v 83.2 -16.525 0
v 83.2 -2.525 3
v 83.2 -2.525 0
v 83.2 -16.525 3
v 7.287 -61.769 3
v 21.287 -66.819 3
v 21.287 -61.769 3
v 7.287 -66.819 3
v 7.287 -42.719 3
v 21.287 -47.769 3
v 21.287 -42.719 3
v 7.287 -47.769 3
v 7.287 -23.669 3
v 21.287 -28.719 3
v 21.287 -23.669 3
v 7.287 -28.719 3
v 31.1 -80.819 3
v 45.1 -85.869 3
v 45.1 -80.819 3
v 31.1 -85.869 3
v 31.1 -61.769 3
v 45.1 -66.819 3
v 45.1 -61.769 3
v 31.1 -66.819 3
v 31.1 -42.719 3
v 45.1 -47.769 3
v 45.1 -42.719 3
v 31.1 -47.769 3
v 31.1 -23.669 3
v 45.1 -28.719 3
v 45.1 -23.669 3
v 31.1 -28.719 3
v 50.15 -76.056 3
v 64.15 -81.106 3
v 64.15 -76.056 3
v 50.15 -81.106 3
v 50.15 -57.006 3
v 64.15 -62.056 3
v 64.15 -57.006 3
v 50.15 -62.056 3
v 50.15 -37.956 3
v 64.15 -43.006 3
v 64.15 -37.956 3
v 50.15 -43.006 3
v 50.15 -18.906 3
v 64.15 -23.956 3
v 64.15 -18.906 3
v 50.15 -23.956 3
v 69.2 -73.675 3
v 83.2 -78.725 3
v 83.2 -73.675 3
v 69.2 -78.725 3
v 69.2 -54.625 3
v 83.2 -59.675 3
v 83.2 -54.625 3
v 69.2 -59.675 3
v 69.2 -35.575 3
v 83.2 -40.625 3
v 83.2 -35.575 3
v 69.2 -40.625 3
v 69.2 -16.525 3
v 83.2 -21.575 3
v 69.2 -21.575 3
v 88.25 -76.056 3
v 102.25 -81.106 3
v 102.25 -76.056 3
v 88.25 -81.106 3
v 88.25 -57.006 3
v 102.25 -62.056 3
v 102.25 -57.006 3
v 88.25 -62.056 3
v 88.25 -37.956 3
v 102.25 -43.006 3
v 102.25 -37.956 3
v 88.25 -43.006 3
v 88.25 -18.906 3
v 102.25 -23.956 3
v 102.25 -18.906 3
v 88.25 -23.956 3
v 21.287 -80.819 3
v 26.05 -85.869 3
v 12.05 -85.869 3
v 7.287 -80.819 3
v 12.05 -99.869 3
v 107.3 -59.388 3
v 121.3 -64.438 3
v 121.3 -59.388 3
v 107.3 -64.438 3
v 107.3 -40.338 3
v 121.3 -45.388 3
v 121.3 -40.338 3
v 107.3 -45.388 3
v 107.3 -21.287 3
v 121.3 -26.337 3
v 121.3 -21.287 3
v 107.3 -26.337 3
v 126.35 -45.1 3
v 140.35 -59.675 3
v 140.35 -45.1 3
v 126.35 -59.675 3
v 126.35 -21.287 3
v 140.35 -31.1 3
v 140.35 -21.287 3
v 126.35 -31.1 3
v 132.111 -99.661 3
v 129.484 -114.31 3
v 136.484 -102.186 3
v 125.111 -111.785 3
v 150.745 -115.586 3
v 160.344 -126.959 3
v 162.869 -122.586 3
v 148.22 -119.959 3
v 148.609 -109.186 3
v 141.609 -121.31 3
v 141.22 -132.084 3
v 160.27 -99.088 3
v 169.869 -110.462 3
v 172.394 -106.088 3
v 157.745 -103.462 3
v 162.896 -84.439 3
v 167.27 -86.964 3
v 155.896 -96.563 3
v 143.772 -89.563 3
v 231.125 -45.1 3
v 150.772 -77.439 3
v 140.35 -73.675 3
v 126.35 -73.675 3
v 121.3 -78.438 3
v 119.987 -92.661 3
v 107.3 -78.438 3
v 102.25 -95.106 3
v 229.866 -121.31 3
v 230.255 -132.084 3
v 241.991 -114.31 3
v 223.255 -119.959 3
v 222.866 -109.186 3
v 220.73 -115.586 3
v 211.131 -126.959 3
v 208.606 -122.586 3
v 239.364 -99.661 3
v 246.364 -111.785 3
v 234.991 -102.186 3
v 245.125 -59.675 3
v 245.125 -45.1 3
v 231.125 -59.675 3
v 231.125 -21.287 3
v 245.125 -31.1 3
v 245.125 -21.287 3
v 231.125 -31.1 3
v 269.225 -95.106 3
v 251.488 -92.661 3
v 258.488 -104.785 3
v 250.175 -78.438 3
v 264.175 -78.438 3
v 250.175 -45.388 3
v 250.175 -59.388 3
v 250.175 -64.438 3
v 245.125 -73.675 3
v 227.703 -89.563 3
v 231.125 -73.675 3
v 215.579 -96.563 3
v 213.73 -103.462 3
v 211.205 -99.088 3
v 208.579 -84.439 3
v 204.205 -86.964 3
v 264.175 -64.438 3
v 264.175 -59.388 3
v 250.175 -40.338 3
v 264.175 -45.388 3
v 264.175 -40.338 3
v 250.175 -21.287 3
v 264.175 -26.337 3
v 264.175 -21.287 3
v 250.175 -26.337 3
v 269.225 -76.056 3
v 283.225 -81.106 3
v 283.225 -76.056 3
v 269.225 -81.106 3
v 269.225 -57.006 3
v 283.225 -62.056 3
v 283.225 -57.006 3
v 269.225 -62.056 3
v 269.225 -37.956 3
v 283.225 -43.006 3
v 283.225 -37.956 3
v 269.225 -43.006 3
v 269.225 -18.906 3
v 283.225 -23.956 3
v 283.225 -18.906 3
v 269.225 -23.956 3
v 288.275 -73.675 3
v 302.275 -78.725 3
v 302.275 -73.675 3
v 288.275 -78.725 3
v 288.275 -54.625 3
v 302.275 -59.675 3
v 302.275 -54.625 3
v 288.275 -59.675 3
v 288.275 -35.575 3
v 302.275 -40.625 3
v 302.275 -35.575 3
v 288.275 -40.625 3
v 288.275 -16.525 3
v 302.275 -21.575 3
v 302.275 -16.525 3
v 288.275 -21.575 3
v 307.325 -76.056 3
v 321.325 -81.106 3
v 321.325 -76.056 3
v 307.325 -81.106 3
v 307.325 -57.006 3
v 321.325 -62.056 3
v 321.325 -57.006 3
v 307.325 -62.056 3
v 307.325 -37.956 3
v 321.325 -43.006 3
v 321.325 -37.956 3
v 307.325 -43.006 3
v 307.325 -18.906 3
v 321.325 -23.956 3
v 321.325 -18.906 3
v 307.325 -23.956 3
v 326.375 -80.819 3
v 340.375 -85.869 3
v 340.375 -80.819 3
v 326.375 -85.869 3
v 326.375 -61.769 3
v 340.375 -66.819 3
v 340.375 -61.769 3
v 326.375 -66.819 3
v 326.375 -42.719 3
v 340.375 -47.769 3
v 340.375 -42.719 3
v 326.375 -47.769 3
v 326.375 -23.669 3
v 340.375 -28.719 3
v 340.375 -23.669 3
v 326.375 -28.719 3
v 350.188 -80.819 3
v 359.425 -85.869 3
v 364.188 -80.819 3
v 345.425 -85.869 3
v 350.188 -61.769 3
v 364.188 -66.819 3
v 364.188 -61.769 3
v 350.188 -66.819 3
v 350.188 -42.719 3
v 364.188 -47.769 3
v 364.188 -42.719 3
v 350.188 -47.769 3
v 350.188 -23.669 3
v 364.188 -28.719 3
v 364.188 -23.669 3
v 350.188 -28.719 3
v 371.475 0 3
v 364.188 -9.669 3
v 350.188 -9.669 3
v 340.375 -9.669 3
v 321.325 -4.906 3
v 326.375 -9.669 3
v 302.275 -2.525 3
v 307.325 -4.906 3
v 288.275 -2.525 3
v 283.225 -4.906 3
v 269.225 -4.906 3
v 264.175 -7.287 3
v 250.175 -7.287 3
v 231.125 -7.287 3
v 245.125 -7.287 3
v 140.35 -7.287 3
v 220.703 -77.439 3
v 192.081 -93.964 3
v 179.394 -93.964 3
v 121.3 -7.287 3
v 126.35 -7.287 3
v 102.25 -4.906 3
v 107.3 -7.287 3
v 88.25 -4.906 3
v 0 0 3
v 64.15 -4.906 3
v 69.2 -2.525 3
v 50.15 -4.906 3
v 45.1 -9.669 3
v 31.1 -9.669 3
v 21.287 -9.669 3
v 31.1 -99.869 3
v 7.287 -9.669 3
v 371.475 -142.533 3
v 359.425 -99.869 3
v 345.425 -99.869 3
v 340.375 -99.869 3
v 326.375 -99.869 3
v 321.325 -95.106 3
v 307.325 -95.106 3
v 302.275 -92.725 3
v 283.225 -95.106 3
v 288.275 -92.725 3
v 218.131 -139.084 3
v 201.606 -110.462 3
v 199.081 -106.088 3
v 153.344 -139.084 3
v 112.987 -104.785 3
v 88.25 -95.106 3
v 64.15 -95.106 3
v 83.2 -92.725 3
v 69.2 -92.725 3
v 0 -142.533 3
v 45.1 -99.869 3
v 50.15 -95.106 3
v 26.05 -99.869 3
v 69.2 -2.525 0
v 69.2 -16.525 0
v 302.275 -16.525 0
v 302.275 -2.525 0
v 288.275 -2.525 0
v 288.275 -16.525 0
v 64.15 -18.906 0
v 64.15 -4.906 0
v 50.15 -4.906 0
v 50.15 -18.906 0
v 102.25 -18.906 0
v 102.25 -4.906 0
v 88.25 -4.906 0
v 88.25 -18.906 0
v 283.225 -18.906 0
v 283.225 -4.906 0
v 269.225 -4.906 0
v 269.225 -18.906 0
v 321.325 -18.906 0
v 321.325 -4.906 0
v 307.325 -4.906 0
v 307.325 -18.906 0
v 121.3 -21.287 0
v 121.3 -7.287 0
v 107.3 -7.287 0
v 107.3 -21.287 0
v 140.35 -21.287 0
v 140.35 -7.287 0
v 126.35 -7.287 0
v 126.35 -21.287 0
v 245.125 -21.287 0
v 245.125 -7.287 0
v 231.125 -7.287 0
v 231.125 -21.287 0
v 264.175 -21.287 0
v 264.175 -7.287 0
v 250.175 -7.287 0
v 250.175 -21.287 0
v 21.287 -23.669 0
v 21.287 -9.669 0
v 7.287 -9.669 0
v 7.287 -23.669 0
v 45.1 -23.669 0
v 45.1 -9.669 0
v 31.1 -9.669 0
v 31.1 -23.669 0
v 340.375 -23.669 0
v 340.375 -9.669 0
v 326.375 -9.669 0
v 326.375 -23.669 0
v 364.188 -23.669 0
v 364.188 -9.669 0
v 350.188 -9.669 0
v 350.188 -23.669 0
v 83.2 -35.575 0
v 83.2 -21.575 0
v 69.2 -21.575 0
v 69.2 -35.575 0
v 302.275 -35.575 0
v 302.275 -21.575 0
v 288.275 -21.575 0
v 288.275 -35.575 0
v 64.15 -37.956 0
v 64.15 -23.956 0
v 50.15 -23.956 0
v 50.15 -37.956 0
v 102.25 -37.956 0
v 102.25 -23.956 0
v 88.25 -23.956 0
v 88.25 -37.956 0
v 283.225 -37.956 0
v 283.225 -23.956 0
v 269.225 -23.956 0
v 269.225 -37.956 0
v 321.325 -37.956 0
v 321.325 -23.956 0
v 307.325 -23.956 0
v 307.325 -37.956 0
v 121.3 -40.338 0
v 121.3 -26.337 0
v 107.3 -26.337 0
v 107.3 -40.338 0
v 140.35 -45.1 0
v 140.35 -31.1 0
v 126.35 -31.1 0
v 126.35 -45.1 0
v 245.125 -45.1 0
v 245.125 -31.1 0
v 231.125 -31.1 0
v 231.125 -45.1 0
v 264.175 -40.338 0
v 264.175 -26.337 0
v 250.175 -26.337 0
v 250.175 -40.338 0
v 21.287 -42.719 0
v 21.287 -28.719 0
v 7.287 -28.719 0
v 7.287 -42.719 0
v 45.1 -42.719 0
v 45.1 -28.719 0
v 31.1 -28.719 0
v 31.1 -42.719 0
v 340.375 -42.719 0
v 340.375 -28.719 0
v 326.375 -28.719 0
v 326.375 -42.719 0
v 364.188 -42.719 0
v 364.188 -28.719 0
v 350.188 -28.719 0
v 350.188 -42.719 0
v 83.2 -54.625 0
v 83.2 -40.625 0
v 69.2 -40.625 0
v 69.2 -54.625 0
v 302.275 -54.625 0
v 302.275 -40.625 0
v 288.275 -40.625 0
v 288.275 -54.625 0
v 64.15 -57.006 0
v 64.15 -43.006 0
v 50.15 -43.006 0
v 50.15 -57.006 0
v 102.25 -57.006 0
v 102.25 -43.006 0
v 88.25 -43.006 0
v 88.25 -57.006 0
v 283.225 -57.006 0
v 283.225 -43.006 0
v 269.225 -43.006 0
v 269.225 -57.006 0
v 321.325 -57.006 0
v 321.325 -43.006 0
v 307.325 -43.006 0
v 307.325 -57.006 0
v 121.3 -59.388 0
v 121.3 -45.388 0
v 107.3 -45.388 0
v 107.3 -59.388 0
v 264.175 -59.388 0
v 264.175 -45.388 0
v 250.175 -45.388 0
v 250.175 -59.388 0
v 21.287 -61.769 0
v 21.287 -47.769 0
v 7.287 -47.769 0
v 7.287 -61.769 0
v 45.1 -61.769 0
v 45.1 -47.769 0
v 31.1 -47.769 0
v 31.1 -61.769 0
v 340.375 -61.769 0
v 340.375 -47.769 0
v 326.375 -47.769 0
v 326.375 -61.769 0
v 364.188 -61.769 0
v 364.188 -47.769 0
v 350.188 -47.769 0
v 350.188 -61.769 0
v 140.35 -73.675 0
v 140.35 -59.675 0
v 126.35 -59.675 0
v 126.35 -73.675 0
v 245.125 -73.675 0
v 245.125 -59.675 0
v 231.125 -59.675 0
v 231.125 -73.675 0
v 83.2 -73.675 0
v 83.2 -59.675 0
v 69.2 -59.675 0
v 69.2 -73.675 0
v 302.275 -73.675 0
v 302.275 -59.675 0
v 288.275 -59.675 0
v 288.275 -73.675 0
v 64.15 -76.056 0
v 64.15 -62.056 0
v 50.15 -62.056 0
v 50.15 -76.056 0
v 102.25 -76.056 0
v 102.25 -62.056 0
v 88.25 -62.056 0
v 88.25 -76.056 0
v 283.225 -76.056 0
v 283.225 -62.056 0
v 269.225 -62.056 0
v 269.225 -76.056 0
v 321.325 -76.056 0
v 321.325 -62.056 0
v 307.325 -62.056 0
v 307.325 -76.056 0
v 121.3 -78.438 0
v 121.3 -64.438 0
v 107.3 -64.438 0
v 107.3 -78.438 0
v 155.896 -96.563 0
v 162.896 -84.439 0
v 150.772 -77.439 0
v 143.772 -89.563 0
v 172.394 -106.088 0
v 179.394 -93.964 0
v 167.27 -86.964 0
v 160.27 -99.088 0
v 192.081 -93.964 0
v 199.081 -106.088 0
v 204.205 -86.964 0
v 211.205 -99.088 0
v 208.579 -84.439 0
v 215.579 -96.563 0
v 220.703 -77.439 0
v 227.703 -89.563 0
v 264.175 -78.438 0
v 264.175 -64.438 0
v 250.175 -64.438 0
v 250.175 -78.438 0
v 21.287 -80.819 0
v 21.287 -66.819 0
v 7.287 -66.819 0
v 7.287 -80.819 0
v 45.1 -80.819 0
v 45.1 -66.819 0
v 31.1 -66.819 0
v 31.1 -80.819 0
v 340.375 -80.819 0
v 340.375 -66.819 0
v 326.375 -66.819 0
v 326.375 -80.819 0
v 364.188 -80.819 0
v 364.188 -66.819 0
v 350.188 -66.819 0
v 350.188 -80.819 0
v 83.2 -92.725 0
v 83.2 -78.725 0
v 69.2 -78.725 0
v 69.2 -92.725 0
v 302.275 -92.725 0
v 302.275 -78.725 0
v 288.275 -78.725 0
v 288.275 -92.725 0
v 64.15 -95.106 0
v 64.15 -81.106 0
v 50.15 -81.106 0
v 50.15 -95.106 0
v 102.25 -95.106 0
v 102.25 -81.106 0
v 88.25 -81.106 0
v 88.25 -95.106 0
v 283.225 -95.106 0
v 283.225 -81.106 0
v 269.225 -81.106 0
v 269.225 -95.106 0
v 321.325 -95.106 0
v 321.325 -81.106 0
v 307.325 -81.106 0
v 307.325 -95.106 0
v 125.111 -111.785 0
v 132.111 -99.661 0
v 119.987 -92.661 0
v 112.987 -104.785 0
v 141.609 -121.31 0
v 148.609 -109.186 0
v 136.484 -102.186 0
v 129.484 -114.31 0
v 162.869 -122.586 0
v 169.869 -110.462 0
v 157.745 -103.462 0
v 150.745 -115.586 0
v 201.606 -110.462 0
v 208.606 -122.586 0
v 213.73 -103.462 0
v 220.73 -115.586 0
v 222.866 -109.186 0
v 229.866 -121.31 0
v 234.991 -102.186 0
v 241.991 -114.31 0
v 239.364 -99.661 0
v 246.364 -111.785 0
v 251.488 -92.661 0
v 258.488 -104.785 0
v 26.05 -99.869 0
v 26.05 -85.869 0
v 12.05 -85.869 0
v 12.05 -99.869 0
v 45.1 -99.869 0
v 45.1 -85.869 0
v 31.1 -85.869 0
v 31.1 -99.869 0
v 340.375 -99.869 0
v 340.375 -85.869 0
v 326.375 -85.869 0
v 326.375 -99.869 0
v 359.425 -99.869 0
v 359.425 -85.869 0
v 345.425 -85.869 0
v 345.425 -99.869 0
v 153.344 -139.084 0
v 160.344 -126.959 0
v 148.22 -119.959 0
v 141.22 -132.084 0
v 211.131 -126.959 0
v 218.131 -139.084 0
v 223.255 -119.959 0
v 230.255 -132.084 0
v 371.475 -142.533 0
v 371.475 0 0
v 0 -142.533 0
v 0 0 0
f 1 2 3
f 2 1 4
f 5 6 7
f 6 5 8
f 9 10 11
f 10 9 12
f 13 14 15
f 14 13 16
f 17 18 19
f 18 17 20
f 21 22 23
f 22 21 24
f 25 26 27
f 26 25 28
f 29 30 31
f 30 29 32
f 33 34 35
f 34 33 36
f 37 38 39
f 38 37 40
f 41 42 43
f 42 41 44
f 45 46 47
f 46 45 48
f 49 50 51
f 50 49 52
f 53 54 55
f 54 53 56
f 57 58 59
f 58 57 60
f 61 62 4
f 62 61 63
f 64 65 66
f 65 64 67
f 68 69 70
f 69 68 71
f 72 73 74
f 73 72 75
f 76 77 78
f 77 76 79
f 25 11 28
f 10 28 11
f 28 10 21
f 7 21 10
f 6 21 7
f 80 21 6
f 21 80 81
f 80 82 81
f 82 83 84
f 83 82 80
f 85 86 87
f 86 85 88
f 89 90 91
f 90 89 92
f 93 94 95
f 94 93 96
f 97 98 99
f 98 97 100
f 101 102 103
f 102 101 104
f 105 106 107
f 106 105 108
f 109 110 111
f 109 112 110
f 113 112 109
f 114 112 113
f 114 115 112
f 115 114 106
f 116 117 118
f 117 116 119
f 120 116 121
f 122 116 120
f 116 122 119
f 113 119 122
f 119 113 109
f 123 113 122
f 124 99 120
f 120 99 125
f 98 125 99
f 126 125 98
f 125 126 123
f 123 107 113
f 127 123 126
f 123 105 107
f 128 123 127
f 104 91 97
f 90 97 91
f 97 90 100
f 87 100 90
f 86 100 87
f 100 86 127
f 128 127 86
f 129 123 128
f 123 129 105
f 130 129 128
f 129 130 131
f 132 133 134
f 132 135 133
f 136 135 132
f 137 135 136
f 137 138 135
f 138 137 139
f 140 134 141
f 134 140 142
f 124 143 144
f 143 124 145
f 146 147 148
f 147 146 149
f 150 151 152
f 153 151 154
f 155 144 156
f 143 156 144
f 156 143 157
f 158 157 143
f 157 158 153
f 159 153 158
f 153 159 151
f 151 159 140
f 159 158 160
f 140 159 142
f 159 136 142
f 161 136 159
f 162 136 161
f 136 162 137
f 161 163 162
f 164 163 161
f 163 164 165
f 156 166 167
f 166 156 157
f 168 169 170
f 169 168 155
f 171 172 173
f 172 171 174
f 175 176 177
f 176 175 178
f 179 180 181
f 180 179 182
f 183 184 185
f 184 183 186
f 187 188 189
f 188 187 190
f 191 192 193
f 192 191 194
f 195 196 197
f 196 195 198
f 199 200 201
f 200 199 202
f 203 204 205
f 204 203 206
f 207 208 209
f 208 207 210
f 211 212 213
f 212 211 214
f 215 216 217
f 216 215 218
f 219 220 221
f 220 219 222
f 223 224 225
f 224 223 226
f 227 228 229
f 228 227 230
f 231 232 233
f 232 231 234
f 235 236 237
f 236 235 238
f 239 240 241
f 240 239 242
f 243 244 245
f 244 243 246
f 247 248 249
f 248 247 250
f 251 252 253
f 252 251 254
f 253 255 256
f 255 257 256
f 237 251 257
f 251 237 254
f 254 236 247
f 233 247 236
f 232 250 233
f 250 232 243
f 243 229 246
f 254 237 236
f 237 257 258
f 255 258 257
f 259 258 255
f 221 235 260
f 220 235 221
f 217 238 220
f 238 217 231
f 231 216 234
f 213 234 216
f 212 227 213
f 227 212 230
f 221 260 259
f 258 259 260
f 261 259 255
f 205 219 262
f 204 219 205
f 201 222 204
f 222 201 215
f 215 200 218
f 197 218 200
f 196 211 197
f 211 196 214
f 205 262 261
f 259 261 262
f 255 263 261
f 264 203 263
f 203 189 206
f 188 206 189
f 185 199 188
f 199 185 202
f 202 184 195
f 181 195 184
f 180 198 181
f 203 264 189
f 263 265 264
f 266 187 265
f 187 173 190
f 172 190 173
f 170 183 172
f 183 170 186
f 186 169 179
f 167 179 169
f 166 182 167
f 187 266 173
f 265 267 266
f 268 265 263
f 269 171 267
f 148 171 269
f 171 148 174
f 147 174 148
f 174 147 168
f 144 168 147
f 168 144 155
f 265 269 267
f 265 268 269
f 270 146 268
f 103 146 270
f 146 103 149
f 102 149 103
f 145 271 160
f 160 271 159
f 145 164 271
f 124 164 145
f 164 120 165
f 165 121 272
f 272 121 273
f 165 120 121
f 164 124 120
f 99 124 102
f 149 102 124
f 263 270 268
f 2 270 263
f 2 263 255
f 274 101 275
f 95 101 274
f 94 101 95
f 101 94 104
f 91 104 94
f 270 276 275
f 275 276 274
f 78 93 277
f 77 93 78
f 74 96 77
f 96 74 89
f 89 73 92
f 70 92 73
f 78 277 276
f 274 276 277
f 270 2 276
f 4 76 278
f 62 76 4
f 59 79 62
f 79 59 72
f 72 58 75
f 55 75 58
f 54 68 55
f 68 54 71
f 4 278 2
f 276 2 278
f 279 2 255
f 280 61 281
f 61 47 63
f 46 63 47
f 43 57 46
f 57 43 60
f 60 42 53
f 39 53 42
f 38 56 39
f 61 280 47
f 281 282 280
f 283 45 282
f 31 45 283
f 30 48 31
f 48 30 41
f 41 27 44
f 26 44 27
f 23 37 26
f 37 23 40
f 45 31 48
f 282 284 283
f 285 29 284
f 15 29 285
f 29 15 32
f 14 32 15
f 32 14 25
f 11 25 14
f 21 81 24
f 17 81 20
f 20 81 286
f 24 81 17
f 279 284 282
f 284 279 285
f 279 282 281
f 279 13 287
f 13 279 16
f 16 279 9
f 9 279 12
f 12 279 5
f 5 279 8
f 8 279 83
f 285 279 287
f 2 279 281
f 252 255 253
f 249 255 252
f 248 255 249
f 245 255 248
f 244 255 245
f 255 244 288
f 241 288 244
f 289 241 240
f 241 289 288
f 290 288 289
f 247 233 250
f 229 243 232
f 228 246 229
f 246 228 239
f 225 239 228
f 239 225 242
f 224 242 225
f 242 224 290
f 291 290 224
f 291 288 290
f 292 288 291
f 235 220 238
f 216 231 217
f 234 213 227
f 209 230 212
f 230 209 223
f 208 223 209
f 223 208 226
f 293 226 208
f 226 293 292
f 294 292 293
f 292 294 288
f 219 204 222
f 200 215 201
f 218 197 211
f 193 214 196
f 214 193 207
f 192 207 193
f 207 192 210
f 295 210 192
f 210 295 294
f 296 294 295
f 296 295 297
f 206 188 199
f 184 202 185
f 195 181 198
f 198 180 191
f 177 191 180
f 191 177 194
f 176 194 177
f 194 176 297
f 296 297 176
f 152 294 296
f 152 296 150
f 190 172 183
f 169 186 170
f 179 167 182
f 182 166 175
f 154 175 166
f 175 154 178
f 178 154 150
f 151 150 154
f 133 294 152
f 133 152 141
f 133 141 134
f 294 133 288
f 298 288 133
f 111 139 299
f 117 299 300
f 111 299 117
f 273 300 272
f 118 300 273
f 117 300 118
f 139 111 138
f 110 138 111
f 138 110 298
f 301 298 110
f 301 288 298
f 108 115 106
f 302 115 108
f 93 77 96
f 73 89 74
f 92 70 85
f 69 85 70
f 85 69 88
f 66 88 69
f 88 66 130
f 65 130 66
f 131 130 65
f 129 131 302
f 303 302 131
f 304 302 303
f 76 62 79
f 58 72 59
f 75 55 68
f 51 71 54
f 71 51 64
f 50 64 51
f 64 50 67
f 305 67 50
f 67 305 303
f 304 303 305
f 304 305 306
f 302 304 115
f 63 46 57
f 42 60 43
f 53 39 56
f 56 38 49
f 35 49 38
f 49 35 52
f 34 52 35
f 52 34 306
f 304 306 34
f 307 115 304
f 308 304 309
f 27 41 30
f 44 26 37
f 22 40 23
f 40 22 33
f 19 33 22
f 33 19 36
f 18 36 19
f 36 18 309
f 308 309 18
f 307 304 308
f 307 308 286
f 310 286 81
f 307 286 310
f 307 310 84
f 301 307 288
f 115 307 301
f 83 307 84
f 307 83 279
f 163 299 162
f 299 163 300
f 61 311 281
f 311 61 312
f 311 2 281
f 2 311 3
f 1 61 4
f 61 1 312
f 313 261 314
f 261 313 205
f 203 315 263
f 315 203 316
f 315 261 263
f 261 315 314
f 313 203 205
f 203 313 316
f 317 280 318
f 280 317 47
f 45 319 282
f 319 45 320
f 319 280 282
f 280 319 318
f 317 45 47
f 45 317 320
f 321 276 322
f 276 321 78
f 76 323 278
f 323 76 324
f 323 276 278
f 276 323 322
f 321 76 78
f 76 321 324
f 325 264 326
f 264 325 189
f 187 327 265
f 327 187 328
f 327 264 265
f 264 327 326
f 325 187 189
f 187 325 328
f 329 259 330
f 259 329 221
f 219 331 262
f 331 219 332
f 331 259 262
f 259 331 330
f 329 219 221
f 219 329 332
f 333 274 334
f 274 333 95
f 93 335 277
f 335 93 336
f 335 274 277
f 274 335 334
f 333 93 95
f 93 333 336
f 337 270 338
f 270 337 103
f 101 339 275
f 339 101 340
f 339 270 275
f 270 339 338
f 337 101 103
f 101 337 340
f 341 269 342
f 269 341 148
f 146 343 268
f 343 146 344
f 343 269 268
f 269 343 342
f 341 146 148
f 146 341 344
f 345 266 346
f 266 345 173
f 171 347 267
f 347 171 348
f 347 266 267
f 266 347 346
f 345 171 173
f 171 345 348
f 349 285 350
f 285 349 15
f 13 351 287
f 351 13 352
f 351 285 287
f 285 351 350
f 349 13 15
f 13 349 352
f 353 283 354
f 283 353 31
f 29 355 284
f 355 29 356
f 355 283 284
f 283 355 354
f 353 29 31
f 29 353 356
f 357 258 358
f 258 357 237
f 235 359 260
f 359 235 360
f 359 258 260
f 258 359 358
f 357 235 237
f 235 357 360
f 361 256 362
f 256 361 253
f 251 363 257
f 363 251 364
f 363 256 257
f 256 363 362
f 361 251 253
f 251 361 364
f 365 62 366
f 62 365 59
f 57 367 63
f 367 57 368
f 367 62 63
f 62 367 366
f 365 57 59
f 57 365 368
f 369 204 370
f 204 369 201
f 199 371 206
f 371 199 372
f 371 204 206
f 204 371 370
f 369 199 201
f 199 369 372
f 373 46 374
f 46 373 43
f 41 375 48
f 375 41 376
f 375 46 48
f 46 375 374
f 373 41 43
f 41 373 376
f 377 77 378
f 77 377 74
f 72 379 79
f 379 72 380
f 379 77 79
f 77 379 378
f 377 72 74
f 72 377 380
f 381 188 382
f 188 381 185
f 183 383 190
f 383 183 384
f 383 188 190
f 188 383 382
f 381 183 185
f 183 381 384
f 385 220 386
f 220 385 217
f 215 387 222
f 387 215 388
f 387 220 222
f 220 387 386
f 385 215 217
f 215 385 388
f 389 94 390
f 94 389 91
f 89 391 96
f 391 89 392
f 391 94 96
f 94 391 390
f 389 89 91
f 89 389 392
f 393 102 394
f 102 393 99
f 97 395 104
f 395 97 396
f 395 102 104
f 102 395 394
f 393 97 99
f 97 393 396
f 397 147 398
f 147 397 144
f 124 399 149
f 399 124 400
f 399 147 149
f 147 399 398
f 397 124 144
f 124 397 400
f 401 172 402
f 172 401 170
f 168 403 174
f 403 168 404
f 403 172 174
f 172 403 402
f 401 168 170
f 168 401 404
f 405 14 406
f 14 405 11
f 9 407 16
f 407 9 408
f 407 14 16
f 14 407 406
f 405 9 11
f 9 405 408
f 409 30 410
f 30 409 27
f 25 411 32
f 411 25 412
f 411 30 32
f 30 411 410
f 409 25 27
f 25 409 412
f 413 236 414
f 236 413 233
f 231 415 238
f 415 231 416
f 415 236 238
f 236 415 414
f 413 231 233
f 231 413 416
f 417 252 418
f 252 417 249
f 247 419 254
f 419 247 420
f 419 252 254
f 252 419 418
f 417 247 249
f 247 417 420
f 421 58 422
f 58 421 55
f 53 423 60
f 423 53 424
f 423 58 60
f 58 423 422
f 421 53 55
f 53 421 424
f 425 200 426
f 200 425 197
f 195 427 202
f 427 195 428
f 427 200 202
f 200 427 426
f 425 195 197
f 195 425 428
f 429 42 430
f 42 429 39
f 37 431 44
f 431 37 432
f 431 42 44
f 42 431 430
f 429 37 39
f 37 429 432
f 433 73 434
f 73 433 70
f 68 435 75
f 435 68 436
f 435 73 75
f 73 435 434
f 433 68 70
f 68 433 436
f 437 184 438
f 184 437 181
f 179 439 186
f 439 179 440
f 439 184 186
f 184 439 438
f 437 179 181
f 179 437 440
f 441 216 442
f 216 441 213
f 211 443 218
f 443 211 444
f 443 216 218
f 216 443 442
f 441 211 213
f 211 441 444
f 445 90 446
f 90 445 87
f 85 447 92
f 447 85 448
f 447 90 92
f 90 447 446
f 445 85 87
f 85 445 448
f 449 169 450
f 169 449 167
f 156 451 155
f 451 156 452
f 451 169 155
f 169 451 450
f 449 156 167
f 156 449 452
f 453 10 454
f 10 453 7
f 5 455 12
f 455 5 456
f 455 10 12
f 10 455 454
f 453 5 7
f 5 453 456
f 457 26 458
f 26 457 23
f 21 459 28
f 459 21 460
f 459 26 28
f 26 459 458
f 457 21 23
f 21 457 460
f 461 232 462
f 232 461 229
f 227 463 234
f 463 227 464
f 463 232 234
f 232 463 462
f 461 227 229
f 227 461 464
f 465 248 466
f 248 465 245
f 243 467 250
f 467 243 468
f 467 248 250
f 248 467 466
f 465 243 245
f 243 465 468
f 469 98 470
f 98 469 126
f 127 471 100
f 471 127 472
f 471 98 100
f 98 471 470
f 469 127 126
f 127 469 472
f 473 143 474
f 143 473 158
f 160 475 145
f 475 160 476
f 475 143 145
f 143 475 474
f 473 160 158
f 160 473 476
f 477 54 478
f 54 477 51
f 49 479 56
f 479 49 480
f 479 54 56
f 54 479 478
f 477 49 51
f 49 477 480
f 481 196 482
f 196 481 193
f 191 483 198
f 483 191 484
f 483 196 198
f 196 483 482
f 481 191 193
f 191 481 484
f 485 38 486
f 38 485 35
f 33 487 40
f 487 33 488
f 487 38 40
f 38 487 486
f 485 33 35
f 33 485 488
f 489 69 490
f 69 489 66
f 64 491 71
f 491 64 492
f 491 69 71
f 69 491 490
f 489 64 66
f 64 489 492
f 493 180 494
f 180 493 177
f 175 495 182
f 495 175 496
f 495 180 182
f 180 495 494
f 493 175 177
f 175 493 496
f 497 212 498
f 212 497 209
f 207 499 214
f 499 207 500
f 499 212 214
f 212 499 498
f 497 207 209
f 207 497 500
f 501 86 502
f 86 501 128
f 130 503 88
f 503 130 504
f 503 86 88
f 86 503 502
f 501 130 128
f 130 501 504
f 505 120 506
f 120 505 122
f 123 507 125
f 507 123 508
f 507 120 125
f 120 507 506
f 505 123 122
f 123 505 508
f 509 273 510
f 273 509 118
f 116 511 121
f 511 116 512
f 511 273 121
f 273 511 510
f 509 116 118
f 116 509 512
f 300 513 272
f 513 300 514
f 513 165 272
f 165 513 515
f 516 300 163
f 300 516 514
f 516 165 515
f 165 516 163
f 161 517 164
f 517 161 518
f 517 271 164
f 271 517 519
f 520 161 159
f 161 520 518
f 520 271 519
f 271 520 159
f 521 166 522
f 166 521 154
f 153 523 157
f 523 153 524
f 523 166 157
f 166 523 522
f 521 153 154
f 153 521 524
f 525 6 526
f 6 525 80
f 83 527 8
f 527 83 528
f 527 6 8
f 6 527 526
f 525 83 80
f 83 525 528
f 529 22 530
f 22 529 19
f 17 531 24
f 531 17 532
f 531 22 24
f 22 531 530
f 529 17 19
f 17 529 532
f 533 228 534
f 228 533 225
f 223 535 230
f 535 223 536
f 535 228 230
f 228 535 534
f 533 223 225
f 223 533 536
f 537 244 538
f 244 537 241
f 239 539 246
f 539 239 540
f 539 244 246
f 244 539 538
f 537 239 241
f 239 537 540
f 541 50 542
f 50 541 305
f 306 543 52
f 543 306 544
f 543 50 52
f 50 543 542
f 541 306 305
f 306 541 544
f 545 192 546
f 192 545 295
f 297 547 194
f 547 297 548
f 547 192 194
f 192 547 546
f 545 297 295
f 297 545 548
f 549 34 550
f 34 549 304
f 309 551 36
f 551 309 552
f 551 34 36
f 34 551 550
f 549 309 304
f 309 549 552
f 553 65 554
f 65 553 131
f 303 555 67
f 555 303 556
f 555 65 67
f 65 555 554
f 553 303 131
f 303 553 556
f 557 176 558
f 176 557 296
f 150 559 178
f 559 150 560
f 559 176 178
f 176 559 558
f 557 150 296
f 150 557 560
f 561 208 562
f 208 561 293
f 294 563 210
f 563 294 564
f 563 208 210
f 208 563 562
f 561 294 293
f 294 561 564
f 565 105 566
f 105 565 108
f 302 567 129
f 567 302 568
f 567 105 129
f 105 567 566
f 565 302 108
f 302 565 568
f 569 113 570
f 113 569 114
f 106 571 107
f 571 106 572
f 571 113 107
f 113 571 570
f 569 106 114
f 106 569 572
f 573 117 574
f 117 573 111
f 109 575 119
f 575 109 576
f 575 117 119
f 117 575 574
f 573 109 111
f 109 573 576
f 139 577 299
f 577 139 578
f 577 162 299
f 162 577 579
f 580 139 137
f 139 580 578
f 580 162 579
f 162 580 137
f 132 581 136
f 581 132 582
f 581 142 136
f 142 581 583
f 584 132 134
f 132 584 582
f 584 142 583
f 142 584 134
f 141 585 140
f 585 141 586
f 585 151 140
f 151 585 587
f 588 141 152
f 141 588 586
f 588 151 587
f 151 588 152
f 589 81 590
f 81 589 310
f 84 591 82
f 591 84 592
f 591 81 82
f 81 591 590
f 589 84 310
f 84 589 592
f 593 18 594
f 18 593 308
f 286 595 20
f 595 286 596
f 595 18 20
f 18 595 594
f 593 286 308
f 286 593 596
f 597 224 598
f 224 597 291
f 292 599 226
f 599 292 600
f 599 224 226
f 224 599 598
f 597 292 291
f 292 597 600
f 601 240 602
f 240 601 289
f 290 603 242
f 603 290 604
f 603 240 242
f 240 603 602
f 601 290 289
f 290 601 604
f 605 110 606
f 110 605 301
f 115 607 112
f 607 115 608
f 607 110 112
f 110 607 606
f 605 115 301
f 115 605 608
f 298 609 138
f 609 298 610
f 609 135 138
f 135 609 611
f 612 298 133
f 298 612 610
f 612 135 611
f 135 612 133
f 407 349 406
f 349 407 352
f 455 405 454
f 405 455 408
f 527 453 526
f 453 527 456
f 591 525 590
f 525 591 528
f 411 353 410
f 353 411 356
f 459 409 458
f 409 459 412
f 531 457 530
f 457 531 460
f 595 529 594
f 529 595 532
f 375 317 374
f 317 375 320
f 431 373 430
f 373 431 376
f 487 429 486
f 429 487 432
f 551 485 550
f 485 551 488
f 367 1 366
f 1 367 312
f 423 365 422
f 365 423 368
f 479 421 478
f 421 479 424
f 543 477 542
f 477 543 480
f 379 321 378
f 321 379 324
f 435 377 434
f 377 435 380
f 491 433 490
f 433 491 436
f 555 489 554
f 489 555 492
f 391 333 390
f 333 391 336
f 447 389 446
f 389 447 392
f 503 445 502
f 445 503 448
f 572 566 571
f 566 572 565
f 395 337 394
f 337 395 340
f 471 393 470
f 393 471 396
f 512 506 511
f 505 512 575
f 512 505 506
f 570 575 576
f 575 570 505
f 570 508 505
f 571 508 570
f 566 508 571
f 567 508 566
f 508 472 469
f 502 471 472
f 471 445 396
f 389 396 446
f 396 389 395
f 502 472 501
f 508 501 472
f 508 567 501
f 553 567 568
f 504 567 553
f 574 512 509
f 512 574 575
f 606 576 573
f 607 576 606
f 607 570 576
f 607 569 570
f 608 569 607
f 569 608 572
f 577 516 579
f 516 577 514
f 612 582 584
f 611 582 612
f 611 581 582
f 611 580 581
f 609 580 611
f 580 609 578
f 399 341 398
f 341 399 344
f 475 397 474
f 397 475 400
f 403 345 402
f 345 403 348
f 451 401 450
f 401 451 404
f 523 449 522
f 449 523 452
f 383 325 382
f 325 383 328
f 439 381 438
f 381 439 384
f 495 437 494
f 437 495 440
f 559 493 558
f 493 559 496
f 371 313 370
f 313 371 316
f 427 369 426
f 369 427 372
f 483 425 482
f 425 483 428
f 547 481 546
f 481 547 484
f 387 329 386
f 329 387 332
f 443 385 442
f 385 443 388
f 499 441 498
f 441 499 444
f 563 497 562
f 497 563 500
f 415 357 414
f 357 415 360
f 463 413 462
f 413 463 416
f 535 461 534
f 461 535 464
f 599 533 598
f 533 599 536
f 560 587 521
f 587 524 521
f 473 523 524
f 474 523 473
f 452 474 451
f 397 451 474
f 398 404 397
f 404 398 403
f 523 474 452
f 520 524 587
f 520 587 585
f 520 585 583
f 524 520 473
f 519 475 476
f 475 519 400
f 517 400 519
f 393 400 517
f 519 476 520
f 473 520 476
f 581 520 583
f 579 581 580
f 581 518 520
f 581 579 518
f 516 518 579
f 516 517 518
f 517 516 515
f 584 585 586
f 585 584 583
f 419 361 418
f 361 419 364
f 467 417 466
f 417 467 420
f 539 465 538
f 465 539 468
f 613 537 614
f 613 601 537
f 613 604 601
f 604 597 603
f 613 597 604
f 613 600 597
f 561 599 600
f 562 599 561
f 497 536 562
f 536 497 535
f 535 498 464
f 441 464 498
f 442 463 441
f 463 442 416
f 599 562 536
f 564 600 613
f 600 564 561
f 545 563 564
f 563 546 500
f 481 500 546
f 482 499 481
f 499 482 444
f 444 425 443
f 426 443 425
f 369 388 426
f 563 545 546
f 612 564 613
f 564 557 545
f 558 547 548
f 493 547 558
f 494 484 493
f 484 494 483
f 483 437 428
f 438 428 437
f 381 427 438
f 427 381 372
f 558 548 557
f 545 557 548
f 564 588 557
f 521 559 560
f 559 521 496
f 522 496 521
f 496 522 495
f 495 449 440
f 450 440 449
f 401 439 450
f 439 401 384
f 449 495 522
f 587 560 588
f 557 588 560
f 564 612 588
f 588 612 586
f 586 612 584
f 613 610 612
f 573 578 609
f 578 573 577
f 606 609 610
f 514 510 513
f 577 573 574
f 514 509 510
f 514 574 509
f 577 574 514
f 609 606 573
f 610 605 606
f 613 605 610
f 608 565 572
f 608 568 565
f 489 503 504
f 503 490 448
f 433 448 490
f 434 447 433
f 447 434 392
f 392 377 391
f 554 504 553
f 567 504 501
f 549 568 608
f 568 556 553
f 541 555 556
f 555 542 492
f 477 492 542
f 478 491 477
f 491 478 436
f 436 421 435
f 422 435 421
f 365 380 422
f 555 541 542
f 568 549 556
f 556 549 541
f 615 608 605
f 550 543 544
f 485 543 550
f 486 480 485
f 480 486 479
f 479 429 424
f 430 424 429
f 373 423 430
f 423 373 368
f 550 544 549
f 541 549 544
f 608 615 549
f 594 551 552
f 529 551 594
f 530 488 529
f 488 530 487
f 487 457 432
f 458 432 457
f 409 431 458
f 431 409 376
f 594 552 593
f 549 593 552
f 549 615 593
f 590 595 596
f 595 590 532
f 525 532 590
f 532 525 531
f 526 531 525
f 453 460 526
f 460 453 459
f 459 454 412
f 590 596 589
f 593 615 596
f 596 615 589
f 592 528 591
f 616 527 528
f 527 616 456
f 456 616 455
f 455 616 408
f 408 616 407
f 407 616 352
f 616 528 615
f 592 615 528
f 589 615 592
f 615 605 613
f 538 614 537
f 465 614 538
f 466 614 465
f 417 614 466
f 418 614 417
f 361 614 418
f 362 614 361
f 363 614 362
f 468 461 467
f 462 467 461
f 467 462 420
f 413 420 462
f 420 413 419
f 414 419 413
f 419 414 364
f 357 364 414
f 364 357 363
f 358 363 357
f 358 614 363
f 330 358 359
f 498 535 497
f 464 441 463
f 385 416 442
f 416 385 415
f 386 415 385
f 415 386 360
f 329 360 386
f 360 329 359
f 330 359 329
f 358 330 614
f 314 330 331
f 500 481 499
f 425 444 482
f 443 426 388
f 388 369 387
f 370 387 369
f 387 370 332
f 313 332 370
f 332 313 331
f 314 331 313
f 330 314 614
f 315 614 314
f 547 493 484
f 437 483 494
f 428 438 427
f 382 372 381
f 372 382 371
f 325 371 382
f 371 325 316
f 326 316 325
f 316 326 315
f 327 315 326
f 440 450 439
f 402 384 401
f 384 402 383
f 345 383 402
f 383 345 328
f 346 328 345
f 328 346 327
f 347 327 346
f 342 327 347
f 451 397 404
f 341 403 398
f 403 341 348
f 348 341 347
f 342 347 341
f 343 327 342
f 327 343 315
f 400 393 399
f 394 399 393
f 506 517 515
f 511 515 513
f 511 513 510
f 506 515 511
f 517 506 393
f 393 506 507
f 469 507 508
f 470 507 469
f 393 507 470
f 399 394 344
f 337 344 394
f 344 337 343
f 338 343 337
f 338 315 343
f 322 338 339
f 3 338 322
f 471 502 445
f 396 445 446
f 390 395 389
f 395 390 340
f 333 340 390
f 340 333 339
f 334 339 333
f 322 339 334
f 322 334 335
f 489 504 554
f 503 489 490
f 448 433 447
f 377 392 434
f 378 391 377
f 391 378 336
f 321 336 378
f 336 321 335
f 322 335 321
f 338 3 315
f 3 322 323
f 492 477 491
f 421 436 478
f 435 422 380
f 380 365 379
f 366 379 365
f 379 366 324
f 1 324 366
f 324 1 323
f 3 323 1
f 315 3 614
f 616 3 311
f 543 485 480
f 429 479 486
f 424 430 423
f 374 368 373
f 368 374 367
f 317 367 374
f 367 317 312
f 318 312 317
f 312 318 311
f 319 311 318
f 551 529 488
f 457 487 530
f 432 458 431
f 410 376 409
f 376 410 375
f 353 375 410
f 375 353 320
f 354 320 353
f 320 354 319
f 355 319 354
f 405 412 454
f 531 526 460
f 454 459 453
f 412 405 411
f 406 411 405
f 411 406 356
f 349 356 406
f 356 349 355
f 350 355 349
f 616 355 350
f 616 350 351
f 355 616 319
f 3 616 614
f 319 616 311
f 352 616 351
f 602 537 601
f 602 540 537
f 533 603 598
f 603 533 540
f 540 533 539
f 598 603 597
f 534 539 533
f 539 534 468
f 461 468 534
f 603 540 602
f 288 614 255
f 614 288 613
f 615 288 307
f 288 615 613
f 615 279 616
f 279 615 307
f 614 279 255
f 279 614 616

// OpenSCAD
$fn = $preview ? 0 : 100;


difference(){
	difference() {
		union() {
			linear_extrude(height = 3) {
				polygon(points = [[0.0, -142.53306788418715], [371.475, -142.53306788418715], [371.475, 0.0], [0.0, 0.0], [0.0, -142.53306788418715]]);
			}
		}
	}
	/* Holes Below*/
	union(){
		translate(v = [76.2000000000, -9.5250000000, 0]) {
			cube(center = true, size = [14, 14, 6]);
		}
		translate(v = [295.2750000000, -9.5250000000, 0]) {
			cube(center = true, size = [14, 14, 6]);
		}
		translate(v = [57.1500000000, -11.9062500000, 0]) {
			cube(center = true, size = [14, 14, 6]);
		}
		translate(v = [95.2500000000, -11.9062500000, 0]) {
			cube(center = true, size = [14, 14, 6]);
		}
		translate(v = [276.2250000000, -11.9062500000, 0]) {
			cube(center = true, size = [14, 14, 6]);
		}
		translate(v = [314.3250000000, -11.9062500000, 0]) {
			cube(center = true, size = [14, 14, 6]);
		}
		translate(v = [114.3000000000, -14.2875000000, 0]) {
			cube(center = true, size = [14, 14, 6]);
		}
		translate(v = [133.3500000000, -14.2875000000, 0]) {
			cube(center = true, size = [14, 14, 6]);
		}
		translate(v = [238.1250000000, -14.2875000000, 0]) {
			cube(center = true, size = [14, 14, 6]);
		}
		translate(v = [257.1750000000, -14.2875000000, 0]) {
			cube(center = true, size = [14, 14, 6]);
		}
		translate(v = [14.2875000000, -16.6687500000, 0]) {
			cube(center = true, size = [14, 14, 6]);
		}
		translate(v = [38.1000000000, -16.6687500000, 0]) {
			cube(center = true, size = [14, 14, 6]);
		}
		translate(v = [333.3750000000, -16.6687500000, 0]) {
			cube(center = true, size = [14, 14, 6]);
		}
		translate(v = [357.1875000000, -16.6687500000, 0]) {
			cube(center = true, size = [14, 14, 6]);
		}
		translate(v = [76.2000000000, -28.5750000000, 0]) {
			cube(center = true, size = [14, 14, 6]);
		}
		translate(v = [295.2750000000, -28.5750000000, 0]) {
			cube(center = true, size = [14, 14, 6]);
		}
		translate(v = [57.1500000000, -30.9562500000, 0]) {
			cube(center = true, size = [14, 14, 6]);
		}
		translate(v = [95.2500000000, -30.9562500000, 0]) {
			cube(center = true, size = [14, 14, 6]);
		}
		translate(v = [276.2250000000, -30.9562500000, 0]) {
			cube(center = true, size = [14, 14, 6]);
		}
		translate(v = [314.3250000000, -30.9562500000, 0]) {
			cube(center = true, size = [14, 14, 6]);
		}
		translate(v = [114.3000000000, -33.3375000000, 0]) {
			cube(center = true, size = [14, 14, 6]);
		}
		translate(v = [133.3500000000, -38.1000000000, 0]) {
			cube(center = true, size = [14, 14, 6]);
		}
		translate(v = [238.1250000000, -38.1000000000, 0]) {
			cube(center = true, size = [14, 14, 6]);
		}
		translate(v = [257.1750000000, -33.3375000000, 0]) {
			cube(center = true, size = [14, 14, 6]);
		}
		translate(v = [14.2875000000, -35.7187500000, 0]) {
			cube(center = true, size = [14, 14, 6]);
		}
		translate(v = [38.1000000000, -35.7187500000, 0]) {
			cube(center = true, size = [14, 14, 6]);
		}
		translate(v = [333.3750000000, -35.7187500000, 0]) {
			cube(center = true, size = [14, 14, 6]);
		}
		translate(v = [357.1875000000, -35.7187500000, 0]) {
			cube(center = true, size = [14, 14, 6]);
		}
		translate(v = [76.2000000000, -47.6250000000, 0]) {
			cube(center = true, size = [14, 14, 6]);
		}
		translate(v = [295.2750000000, -47.6250000000, 0]) {
			cube(center = true, size = [14, 14, 6]);
		}
		translate(v = [57.1500000000, -50.0062500000, 0]) {
			cube(center = true, size = [14, 14, 6]);
		}
		translate(v = [95.2500000000, -50.0062500000, 0]) {
			cube(center = true, size = [14, 14, 6]);
		}
		translate(v = [276.2250000000, -50.0062500000, 0]) {
			cube(center = true, size = [14, 14, 6]);
		}
		translate(v = [314.3250000000, -50.0062500000, 0]) {
			cube(center = true, size = [14, 14, 6]);
		}
		translate(v = [114.3000000000, -52.3875000000, 0]) {
			cube(center = true, size = [14, 14, 6]);
		}
		translate(v = [257.1750000000, -52.3875000000, 0]) {
			cube(center = true, size = [14, 14, 6]);
		}
		translate(v = [14.2875000000, -54.7687500000, 0]) {
			cube(center = true, size = [14, 14, 6]);
		}
		translate(v = [38.1000000000, -54.7687500000, 0]) {
			cube(center = true, size = [14, 14, 6]);
		}
		translate(v = [333.3750000000, -54.7687500000, 0]) {
			cube(center = true, size = [14, 14, 6]);
		}
		translate(v = [357.1875000000, -54.7687500000, 0]) {
			cube(center = true, size = [14, 14, 6]);
		}
		translate(v = [133.3500000000, -66.6750000000, 0]) {
			cube(center = true, size = [14, 14, 6]);
		}
		translate(v = [238.1250000000, -66.6750000000, 0]) {
			cube(center = true, size = [14, 14, 6]);
		}
		translate(v = [76.2000000000, -66.6750000000, 0]) {
			cube(center = true, size = [14, 14, 6]);
		}
		translate(v = [295.2750000000, -66.6750000000, 0]) {
			cube(center = true, size = [14, 14, 6]);
		}
		translate(v = [57.1500000000, -69.0562500000, 0]) {
			cube(center = true, size = [14, 14, 6]);
		}
		translate(v = [95.2500000000, -69.0562500000, 0]) {
			cube(center = true, size = [14, 14, 6]);
		}
		translate(v = [276.2250000000, -69.0562500000, 0]) {
			cube(center = true, size = [14, 14, 6]);
		}
		translate(v = [314.3250000000, -69.0562500000, 0]) {
			cube(center = true, size = [14, 14, 6]);
		}
		translate(v = [114.3000000000, -71.4375000000, 0]) {
			cube(center = true, size = [14, 14, 6]);
		}
		translate(v = [153.3341759131, -87.0011080290, 0]) {
			rotate(a = -30) {
				cube(center = true, size = [14, 14, 6]);
			}
		}
		translate(v = [169.8319598552, -96.5261080290, 0]) {
			rotate(a = -30) {
				cube(center = true, size = [14, 14, 6]);
			}
		}
		translate(v = [201.6430401448, -96.5261080290, 0]) {
			rotate(a = 30) {
				cube(center = true, size = [14, 14, 6]);
			}
		}
		translate(v = [218.1408240869, -87.0011080290, 0]) {
			rotate(a = 30) {
				cube(center = true, size = [14, 14, 6]);
			}
		}
		translate(v = [257.1750000000, -71.4375000000, 0]) {
			cube(center = true, size = [14, 14, 6]);
		}
		translate(v = [14.2875000000, -73.8187500000, 0]) {
			cube(center = true, size = [14, 14, 6]);
		}
		translate(v = [38.1000000000, -73.8187500000, 0]) {
			cube(center = true, size = [14, 14, 6]);
		}
		translate(v = [333.3750000000, -73.8187500000, 0]) {
			cube(center = true, size = [14, 14, 6]);
		}
		translate(v = [357.1875000000, -73.8187500000, 0]) {
			cube(center = true, size = [14, 14, 6]);
		}
		translate(v = [76.2000000000, -85.7250000000, 0]) {
			cube(center = true, size = [14, 14, 6]);
		}
		translate(v = [295.2750000000, -85.7250000000, 0]) {
			cube(center = true, size = [14, 14, 6]);
		}
		translate(v = [57.1500000000, -88.1062500000, 0]) {
			cube(center = true, size = [14, 14, 6]);
		}
		translate(v = [95.2500000000, -88.1062500000, 0]) {
			cube(center = true, size = [14, 14, 6]);
		}
		translate(v = [276.2250000000, -88.1062500000, 0]) {
			cube(center = true, size = [14, 14, 6]);
		}
		translate(v = [314.3250000000, -88.1062500000, 0]) {
			cube(center = true, size = [14, 14, 6]);
		}
		translate(v = [122.5488919710, -102.2227839421, 0]) {
			rotate(a = -30) {
				cube(center = true, size = [14, 14, 6]);
			}
		}
		translate(v = [139.0466759131, -111.7477839421, 0]) {
			rotate(a = -30) {
				cube(center = true, size = [14, 14, 6]);
			}
		}
		translate(v = [160.3069598552, -113.0238919710, 0]) {
			rotate(a = -30) {
				cube(center = true, size = [14, 14, 6]);
			}
		}
		translate(v = [211.1680401448, -113.0238919710, 0]) {
			rotate(a = 30) {
				cube(center = true, size = [14, 14, 6]);
			}
		}
		translate(v = [232.4283240869, -111.7477839421, 0]) {
			rotate(a = 30) {
				cube(center = true, size = [14, 14, 6]);
			}
		}
		translate(v = [248.9261080290, -102.2227839421, 0]) {
			rotate(a = 30) {
				cube(center = true, size = [14, 14, 6]);
			}
		}
		translate(v = [19.0500000000, -92.8687500000, 0]) {
			cube(center = true, size = [14, 14, 6]);
		}
		translate(v = [38.1000000000, -92.8687500000, 0]) {
			cube(center = true, size = [14, 14, 6]);
		}
		translate(v = [333.3750000000, -92.8687500000, 0]) {
			cube(center = true, size = [14, 14, 6]);
		}
		translate(v = [352.4250000000, -92.8687500000, 0]) {
			cube(center = true, size = [14, 14, 6]);
		}
		translate(v = [150.7819598552, -129.5216759131, 0]) {
			rotate(a = -30) {
				cube(center = true, size = [14, 14, 6]);
			}
		}
		translate(v = [220.6930401448, -129.5216759131, 0]) {
			rotate(a = 30) {
				cube(center = true, size = [14, 14, 6]);
			}
		}
	} /* End Holes */ 
}
